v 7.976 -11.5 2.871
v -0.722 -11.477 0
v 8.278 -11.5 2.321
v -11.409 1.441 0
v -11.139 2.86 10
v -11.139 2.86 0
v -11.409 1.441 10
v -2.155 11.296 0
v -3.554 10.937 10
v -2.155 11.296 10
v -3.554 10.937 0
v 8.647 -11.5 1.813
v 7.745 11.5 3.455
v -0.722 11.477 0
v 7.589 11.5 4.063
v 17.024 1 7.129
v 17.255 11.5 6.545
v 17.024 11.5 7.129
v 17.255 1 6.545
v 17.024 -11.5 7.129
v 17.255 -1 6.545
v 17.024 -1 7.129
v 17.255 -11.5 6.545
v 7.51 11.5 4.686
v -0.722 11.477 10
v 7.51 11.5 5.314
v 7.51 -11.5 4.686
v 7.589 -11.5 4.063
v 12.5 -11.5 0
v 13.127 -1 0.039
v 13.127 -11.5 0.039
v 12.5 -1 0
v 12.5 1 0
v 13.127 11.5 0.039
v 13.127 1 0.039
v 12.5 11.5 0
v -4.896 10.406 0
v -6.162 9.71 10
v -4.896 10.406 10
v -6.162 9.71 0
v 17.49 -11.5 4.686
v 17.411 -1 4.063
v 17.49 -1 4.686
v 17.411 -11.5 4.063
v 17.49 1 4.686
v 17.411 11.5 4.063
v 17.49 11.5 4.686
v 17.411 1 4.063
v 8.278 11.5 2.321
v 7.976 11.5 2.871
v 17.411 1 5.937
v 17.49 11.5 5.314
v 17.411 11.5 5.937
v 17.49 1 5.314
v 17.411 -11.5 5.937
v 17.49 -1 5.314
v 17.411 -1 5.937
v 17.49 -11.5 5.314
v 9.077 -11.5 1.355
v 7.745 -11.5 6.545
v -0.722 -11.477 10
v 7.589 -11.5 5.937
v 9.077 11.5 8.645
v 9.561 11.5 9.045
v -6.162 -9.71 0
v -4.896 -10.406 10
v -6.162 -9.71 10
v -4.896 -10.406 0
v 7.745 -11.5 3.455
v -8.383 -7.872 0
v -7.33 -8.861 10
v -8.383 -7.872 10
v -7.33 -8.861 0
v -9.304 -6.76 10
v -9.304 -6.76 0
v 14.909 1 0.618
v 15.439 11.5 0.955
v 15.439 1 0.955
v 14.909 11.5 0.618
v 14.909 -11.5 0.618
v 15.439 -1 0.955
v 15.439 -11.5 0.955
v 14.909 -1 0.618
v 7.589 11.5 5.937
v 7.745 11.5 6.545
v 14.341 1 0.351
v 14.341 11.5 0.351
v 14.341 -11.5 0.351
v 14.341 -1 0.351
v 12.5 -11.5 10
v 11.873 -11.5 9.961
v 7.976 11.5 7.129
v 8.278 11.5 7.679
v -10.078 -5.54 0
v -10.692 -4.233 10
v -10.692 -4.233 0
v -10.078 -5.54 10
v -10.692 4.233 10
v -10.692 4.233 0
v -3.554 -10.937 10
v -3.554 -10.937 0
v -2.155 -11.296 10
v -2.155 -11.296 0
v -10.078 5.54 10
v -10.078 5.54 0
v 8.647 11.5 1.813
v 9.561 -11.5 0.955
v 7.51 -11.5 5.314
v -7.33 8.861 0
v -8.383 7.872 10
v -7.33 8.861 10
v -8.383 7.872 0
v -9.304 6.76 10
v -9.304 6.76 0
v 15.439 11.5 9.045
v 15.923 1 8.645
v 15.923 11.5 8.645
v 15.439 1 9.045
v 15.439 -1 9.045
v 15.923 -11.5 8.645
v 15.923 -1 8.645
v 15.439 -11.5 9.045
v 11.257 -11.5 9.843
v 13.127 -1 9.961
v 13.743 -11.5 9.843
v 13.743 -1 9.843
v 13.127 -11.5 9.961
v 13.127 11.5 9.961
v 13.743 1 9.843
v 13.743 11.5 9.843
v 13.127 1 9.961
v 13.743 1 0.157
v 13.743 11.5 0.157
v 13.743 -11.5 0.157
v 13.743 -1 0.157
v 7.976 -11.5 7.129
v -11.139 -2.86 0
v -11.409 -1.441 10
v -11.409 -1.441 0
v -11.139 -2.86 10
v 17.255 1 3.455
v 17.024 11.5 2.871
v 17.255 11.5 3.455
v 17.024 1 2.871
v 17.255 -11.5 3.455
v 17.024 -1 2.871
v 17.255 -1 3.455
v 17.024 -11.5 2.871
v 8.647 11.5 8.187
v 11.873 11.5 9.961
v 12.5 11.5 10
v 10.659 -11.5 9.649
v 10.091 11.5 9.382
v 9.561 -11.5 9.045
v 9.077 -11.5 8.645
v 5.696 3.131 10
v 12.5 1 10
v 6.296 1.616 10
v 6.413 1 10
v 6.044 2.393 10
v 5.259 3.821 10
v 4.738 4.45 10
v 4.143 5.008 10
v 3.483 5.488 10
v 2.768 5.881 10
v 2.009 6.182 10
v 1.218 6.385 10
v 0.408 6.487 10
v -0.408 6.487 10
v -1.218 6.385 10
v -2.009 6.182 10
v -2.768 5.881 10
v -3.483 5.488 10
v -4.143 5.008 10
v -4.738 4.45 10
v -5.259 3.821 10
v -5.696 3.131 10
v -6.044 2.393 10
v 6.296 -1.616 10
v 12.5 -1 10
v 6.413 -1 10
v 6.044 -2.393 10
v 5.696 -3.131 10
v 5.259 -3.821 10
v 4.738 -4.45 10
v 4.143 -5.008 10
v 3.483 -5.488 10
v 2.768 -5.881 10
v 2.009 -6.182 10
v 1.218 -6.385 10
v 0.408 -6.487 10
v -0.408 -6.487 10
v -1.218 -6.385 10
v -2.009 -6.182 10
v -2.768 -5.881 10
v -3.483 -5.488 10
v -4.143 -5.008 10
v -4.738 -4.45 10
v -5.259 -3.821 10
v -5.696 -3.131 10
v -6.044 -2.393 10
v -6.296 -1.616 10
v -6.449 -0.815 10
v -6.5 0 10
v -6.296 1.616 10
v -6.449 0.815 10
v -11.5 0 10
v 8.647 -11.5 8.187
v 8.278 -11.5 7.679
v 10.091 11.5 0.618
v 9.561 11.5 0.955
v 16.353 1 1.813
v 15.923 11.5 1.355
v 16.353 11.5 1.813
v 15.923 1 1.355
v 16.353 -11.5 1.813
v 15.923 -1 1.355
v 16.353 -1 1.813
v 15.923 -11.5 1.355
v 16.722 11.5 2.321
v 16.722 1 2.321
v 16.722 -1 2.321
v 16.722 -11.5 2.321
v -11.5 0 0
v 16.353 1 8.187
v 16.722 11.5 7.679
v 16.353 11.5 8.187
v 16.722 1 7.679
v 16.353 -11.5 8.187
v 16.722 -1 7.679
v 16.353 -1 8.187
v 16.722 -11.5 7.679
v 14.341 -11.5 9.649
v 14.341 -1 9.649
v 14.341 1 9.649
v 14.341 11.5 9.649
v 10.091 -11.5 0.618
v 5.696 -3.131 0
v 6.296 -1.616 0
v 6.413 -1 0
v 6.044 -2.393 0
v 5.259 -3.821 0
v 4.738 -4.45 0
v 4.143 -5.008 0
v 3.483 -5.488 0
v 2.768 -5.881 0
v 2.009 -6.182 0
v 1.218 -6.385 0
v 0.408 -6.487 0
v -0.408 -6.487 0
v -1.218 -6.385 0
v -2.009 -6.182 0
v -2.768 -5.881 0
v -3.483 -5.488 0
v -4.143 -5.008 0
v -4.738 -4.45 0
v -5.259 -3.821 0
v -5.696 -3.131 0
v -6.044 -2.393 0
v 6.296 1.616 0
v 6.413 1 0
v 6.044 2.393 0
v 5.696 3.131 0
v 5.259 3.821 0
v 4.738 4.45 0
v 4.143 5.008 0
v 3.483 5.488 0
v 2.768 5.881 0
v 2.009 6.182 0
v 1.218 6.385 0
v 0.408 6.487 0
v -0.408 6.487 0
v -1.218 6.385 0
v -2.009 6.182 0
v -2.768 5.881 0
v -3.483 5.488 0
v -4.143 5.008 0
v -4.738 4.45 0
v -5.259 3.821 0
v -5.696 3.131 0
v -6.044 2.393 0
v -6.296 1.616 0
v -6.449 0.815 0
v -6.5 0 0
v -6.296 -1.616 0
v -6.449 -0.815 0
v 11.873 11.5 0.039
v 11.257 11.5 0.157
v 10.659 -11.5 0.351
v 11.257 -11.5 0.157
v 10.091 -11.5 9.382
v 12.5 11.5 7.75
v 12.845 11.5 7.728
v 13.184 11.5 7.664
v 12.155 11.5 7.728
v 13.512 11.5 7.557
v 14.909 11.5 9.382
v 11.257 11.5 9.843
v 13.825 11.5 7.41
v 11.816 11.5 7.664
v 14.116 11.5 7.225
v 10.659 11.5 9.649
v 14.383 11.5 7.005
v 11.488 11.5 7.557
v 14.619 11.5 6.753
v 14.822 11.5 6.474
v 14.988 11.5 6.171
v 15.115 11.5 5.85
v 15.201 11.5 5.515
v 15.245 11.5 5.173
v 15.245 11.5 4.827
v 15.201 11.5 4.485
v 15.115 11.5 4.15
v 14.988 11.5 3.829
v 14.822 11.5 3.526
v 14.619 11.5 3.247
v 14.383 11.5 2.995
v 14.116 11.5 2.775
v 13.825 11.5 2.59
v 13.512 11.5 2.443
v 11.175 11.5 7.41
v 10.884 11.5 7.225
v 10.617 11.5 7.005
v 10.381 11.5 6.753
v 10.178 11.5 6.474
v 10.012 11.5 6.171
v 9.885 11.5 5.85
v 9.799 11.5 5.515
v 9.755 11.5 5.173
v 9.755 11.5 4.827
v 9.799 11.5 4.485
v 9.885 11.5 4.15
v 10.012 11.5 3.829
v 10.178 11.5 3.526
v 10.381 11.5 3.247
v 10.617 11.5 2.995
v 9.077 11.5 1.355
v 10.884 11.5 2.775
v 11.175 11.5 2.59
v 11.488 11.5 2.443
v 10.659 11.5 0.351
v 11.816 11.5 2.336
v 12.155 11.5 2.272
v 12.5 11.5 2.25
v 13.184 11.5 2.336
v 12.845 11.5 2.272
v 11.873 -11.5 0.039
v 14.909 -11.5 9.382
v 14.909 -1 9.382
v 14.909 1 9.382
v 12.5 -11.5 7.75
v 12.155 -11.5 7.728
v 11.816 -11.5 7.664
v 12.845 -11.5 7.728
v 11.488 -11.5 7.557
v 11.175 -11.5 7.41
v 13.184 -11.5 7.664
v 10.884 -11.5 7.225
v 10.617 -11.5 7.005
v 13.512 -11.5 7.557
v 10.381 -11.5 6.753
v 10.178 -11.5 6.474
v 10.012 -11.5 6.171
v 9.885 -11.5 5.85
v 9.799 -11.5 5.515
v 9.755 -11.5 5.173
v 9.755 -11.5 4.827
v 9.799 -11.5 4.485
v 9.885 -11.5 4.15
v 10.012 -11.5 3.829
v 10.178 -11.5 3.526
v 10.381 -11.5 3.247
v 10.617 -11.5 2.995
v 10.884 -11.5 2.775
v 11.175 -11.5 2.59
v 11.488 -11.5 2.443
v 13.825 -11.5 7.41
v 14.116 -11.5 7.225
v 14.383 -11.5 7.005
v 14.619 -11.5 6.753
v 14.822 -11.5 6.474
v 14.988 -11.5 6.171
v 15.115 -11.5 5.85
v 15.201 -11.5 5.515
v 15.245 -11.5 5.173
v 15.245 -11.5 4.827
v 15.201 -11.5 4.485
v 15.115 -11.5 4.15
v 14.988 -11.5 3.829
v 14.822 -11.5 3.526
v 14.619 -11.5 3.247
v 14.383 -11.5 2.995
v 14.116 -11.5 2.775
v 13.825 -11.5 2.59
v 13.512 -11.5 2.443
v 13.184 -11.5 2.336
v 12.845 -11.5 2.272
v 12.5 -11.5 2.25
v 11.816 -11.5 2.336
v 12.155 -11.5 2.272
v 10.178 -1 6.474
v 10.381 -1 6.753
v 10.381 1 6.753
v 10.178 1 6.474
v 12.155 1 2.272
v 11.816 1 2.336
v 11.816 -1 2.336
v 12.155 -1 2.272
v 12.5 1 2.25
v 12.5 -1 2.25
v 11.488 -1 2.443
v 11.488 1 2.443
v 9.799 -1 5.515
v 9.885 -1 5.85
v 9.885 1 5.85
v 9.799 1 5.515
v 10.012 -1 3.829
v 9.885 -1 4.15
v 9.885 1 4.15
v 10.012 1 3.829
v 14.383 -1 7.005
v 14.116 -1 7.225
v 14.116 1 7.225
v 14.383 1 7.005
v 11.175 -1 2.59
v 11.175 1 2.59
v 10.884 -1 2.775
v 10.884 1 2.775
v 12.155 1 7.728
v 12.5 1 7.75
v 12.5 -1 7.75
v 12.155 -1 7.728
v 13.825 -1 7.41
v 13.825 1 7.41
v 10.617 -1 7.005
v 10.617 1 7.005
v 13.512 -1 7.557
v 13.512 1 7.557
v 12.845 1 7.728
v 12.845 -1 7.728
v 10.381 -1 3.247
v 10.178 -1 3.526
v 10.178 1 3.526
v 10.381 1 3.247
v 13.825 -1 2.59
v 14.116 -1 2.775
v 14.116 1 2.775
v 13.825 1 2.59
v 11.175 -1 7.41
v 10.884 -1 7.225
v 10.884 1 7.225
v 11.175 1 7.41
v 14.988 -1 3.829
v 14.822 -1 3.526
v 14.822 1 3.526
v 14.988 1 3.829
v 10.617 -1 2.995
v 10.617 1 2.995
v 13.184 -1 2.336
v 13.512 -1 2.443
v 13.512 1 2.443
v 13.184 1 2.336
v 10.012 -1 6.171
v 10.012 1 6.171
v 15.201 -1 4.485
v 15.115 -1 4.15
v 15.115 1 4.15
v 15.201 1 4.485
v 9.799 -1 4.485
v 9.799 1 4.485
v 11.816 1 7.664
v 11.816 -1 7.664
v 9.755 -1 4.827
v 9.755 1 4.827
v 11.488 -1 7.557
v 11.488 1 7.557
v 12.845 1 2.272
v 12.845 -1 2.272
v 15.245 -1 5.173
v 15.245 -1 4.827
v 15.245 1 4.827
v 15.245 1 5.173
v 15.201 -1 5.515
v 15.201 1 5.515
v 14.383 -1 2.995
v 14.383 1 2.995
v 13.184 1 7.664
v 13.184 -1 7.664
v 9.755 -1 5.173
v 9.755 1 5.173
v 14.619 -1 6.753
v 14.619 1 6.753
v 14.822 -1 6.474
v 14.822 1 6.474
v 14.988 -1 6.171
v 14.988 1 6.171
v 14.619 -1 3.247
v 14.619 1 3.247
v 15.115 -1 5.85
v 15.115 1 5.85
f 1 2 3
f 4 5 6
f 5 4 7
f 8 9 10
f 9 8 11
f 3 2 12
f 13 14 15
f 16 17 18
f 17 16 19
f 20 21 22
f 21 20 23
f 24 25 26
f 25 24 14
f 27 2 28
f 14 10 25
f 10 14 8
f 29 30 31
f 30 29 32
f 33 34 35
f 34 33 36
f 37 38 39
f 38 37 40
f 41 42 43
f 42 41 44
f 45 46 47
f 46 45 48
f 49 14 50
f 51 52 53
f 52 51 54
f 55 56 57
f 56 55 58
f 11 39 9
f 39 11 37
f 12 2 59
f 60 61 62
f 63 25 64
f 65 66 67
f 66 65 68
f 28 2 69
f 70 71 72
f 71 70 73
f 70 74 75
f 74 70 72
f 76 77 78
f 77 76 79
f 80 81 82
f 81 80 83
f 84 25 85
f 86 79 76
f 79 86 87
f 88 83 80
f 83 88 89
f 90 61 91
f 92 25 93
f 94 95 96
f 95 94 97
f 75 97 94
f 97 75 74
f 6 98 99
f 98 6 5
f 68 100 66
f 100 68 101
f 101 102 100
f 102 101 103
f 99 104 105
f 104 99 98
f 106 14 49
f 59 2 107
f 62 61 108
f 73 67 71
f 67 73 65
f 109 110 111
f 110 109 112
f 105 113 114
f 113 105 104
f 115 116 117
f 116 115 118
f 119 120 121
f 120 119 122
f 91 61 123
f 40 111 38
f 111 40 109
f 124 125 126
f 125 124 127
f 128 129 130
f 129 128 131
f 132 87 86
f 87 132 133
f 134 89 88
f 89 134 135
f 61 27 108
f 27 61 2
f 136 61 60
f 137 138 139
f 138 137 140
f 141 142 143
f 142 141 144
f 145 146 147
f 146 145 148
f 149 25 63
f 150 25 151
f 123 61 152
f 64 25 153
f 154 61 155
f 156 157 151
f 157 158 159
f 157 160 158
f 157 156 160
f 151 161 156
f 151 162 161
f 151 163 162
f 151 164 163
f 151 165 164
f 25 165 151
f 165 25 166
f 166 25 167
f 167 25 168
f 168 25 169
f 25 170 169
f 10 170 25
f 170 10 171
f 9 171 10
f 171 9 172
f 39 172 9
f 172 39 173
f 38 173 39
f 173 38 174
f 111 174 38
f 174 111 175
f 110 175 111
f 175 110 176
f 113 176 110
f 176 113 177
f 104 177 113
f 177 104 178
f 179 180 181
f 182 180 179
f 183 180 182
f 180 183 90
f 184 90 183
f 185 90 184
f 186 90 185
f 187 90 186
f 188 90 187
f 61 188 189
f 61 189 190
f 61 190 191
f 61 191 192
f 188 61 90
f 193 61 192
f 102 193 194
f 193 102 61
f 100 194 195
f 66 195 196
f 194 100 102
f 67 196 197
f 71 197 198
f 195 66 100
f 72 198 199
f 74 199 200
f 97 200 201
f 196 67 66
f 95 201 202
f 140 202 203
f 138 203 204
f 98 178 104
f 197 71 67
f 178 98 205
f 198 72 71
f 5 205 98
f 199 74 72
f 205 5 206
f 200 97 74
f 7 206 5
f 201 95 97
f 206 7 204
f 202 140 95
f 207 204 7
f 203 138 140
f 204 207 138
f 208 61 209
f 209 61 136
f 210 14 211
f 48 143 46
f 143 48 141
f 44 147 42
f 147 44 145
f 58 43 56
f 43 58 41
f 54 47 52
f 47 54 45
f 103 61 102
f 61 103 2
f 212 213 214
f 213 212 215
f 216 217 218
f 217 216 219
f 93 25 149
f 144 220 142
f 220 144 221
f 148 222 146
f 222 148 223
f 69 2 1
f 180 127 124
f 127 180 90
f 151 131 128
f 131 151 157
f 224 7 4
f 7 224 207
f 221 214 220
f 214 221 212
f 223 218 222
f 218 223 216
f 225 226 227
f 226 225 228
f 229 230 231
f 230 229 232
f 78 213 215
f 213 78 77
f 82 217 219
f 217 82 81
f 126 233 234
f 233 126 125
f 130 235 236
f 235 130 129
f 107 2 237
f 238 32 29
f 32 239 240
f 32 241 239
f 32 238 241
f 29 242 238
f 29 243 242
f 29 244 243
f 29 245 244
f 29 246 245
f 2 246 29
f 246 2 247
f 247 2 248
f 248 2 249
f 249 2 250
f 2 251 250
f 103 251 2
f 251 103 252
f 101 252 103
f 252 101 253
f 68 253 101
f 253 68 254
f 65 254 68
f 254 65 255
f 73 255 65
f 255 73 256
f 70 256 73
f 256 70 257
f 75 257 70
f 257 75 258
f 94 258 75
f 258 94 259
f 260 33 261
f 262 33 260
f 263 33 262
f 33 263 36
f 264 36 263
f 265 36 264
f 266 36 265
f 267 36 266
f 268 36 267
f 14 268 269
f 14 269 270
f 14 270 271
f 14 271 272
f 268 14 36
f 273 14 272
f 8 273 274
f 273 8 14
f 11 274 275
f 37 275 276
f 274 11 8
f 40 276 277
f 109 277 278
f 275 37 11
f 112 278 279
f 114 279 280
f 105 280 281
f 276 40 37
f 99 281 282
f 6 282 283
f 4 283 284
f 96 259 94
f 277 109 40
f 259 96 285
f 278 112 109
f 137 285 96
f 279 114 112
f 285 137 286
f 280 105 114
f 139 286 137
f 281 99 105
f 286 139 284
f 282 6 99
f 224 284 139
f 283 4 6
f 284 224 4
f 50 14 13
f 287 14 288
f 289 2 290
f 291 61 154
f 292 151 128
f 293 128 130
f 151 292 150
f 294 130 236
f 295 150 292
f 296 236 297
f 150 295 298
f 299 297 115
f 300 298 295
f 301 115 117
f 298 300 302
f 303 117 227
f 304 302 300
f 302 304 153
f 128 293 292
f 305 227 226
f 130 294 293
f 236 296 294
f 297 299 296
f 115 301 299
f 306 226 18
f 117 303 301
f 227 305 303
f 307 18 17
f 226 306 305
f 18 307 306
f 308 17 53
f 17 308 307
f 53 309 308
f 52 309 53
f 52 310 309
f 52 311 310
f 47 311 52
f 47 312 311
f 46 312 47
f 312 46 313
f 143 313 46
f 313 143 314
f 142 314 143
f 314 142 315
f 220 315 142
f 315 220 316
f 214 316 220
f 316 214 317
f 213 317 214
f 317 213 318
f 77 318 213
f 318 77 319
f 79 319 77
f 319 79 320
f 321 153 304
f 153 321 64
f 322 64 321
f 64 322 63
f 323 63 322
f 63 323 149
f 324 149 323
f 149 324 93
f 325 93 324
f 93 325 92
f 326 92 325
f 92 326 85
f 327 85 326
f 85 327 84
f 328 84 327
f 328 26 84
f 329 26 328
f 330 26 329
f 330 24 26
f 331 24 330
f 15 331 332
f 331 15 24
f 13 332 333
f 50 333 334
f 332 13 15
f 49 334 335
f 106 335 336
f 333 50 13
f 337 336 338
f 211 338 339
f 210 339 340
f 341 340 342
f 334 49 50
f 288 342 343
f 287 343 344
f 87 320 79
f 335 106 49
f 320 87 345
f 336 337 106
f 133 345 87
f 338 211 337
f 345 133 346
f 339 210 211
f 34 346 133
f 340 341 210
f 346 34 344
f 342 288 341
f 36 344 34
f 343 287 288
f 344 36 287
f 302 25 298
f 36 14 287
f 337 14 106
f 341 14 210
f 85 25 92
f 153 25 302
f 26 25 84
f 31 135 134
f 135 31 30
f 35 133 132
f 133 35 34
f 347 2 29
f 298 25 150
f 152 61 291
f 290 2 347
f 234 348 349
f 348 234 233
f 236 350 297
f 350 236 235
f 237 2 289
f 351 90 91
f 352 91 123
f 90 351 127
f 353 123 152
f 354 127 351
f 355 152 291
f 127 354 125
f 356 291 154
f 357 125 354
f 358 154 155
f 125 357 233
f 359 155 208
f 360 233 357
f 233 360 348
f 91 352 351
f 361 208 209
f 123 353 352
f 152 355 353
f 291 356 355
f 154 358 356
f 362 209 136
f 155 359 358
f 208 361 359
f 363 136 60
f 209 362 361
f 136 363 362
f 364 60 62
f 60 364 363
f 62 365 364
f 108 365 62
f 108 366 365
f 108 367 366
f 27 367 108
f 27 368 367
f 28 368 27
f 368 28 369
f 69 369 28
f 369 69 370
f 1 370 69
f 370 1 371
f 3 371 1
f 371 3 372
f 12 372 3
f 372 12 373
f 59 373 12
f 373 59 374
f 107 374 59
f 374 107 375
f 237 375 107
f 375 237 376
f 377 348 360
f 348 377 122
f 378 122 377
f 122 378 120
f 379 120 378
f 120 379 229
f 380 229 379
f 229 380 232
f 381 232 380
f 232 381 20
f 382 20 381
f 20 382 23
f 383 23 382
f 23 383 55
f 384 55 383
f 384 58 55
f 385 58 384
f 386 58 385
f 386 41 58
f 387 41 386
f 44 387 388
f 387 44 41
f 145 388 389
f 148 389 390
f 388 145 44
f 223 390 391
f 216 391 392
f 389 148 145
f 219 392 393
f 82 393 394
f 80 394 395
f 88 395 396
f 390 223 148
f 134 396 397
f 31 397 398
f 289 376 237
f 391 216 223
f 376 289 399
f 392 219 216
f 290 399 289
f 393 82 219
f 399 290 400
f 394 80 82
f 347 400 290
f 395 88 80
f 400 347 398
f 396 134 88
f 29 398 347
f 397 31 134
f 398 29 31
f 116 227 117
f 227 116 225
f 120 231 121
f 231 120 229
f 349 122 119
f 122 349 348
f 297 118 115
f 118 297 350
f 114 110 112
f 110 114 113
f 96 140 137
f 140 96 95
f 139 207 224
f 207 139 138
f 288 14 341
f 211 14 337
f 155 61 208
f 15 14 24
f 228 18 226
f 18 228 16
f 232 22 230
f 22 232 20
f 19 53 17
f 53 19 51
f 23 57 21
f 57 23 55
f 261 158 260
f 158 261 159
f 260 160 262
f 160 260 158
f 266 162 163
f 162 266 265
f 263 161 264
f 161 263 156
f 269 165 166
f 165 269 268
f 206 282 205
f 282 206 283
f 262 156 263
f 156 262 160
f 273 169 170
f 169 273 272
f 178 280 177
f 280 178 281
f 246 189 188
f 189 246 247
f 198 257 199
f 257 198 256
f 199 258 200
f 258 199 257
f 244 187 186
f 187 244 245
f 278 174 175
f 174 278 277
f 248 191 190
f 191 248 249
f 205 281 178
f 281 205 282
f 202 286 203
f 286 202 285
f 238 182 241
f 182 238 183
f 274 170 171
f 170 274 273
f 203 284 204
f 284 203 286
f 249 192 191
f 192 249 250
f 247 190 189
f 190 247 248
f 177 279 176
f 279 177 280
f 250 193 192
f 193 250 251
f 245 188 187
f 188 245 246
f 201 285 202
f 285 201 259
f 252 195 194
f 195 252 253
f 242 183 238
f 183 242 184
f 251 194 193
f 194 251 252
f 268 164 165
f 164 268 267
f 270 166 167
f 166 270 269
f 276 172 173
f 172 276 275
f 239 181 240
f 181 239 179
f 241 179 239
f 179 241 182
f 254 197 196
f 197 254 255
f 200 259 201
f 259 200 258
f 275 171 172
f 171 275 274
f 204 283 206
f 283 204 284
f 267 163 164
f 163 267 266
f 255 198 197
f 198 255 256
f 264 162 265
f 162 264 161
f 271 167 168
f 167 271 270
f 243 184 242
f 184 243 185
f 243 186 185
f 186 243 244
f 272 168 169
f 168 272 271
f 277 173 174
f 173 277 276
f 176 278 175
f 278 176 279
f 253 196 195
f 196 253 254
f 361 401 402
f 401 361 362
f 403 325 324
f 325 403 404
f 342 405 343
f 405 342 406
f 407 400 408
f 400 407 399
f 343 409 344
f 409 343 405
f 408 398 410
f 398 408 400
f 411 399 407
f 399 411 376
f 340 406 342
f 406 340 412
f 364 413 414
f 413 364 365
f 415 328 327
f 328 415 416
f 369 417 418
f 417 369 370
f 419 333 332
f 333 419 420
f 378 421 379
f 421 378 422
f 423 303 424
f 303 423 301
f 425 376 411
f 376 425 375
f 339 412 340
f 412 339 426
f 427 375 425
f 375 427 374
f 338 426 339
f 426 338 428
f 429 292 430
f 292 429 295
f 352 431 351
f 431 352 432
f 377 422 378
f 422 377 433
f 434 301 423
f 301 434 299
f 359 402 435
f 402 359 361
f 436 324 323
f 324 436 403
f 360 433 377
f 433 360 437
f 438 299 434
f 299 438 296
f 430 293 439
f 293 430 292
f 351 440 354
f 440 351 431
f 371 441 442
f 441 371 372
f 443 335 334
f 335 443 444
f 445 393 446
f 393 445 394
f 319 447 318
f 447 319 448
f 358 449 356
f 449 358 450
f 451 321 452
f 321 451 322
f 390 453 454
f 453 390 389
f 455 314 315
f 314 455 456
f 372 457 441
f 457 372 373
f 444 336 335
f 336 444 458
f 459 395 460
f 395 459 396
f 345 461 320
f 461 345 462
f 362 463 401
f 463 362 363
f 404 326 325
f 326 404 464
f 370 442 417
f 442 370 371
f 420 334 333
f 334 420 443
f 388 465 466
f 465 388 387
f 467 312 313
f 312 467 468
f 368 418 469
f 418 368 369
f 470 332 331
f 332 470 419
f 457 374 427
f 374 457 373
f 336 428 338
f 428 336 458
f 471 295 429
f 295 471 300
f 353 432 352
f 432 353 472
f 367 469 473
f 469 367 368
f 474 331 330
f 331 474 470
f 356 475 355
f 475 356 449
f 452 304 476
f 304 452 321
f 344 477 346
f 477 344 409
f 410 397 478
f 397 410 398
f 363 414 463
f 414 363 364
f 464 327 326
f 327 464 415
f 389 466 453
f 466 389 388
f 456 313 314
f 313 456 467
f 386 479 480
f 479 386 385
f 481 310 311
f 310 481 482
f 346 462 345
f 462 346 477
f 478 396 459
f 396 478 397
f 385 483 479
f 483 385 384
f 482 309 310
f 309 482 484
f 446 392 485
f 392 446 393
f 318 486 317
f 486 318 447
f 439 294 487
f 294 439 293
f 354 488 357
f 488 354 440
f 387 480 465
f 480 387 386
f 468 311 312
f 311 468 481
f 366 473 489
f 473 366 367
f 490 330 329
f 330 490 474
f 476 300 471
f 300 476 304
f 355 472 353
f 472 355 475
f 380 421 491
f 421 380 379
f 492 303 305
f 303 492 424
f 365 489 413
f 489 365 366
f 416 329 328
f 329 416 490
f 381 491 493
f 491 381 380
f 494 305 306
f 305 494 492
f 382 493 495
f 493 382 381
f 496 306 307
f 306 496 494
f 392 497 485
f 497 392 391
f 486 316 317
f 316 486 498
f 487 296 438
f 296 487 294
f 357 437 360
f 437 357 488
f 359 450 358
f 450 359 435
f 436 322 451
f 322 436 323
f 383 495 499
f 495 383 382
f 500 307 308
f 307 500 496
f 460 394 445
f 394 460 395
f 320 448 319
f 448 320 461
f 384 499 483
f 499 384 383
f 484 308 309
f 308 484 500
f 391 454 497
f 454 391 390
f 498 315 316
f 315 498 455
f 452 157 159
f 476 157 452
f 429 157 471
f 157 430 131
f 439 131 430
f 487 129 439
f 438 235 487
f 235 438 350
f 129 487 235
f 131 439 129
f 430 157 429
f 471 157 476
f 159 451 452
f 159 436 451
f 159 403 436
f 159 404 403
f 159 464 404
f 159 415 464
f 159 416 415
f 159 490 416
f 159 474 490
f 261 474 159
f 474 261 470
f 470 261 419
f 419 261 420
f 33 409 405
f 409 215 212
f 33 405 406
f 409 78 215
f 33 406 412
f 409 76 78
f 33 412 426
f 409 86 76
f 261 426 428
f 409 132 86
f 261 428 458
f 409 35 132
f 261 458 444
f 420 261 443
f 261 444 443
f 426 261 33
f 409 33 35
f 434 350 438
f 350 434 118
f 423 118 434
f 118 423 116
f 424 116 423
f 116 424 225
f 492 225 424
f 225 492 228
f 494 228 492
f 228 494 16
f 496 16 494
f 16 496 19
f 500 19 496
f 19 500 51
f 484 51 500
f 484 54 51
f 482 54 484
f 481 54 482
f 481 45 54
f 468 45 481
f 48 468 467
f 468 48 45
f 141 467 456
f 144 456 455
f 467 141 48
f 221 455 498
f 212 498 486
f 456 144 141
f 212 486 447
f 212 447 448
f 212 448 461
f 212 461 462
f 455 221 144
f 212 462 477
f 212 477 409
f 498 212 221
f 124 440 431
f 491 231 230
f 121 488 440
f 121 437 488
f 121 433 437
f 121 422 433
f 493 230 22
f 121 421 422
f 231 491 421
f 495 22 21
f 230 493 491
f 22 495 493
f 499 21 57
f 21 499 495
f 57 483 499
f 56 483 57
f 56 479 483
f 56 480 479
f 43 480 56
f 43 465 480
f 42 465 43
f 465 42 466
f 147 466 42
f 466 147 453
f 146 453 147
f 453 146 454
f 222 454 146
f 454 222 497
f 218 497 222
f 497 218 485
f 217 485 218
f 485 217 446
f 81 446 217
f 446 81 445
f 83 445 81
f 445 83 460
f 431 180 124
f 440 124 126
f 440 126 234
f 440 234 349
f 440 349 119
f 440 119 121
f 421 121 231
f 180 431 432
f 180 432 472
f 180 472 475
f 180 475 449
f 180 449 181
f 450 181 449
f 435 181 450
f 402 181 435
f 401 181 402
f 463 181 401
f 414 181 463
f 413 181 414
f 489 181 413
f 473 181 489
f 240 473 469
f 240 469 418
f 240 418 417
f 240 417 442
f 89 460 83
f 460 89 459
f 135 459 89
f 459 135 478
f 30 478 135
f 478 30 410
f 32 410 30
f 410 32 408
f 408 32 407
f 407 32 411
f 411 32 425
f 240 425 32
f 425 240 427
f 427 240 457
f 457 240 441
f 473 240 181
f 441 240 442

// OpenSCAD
$fn=50;

// Clamp length
length_numeric_slider = 10; //[10:50]

// Clamp inner diameter
dia_numeric_slider = 13; //[5:50]

// Clamp wall thickness
wall_numeric_slider = 10; //[2:10]

// Embed a hex nut
nut_drop_down_box = 0; // [0:no, 1:yes]

// Hex nut diameter
nut_dia_numeric_slider = 9; // [5:30]

// Bolthole diameter
bolt_dia_numeric_slider = 5.5; // [3:20]

// Slit width
slit_width_numeric_slider = 2; // [1:5]

clamp(dia_numeric_slider, length_numeric_slider, wall_numeric_slider, nut_drop_down_box, nut_dia_numeric_slider, bolt_dia_numeric_slider, slit_width_numeric_slider);

module clamp(d1, h, wall, nuthole, nuthole_dia, bolt_dia, slit)
{
    outerdia = d1 + wall;

    difference() {
        hull() {
            cylinder(d=outerdia, h=h);
            translate([outerdia/2+1, -outerdia/2, h/2])
            rotate([0, 90, 90])
            cylinder(d=10, h=outerdia);
        }
        translate([0, 0, -1])
        cylinder(d=d1, h=h+2);

        translate([outerdia/2+1, -outerdia/2-1, h/2])
        rotate([0, 90, 90])
        cylinder(d=bolt_dia, h=outerdia+2);


        if (nuthole == 1) {
            translate([outerdia/2+1, -outerdia/2-0.1, h/2])
            rotate([0, 90, 90])
            cylinder(d=nuthole_dia, h=4, $fn=6);
        }
        translate([0, -slit/2, -1])
        cube([outerdia, slit, h+2]);

     }
    
}
